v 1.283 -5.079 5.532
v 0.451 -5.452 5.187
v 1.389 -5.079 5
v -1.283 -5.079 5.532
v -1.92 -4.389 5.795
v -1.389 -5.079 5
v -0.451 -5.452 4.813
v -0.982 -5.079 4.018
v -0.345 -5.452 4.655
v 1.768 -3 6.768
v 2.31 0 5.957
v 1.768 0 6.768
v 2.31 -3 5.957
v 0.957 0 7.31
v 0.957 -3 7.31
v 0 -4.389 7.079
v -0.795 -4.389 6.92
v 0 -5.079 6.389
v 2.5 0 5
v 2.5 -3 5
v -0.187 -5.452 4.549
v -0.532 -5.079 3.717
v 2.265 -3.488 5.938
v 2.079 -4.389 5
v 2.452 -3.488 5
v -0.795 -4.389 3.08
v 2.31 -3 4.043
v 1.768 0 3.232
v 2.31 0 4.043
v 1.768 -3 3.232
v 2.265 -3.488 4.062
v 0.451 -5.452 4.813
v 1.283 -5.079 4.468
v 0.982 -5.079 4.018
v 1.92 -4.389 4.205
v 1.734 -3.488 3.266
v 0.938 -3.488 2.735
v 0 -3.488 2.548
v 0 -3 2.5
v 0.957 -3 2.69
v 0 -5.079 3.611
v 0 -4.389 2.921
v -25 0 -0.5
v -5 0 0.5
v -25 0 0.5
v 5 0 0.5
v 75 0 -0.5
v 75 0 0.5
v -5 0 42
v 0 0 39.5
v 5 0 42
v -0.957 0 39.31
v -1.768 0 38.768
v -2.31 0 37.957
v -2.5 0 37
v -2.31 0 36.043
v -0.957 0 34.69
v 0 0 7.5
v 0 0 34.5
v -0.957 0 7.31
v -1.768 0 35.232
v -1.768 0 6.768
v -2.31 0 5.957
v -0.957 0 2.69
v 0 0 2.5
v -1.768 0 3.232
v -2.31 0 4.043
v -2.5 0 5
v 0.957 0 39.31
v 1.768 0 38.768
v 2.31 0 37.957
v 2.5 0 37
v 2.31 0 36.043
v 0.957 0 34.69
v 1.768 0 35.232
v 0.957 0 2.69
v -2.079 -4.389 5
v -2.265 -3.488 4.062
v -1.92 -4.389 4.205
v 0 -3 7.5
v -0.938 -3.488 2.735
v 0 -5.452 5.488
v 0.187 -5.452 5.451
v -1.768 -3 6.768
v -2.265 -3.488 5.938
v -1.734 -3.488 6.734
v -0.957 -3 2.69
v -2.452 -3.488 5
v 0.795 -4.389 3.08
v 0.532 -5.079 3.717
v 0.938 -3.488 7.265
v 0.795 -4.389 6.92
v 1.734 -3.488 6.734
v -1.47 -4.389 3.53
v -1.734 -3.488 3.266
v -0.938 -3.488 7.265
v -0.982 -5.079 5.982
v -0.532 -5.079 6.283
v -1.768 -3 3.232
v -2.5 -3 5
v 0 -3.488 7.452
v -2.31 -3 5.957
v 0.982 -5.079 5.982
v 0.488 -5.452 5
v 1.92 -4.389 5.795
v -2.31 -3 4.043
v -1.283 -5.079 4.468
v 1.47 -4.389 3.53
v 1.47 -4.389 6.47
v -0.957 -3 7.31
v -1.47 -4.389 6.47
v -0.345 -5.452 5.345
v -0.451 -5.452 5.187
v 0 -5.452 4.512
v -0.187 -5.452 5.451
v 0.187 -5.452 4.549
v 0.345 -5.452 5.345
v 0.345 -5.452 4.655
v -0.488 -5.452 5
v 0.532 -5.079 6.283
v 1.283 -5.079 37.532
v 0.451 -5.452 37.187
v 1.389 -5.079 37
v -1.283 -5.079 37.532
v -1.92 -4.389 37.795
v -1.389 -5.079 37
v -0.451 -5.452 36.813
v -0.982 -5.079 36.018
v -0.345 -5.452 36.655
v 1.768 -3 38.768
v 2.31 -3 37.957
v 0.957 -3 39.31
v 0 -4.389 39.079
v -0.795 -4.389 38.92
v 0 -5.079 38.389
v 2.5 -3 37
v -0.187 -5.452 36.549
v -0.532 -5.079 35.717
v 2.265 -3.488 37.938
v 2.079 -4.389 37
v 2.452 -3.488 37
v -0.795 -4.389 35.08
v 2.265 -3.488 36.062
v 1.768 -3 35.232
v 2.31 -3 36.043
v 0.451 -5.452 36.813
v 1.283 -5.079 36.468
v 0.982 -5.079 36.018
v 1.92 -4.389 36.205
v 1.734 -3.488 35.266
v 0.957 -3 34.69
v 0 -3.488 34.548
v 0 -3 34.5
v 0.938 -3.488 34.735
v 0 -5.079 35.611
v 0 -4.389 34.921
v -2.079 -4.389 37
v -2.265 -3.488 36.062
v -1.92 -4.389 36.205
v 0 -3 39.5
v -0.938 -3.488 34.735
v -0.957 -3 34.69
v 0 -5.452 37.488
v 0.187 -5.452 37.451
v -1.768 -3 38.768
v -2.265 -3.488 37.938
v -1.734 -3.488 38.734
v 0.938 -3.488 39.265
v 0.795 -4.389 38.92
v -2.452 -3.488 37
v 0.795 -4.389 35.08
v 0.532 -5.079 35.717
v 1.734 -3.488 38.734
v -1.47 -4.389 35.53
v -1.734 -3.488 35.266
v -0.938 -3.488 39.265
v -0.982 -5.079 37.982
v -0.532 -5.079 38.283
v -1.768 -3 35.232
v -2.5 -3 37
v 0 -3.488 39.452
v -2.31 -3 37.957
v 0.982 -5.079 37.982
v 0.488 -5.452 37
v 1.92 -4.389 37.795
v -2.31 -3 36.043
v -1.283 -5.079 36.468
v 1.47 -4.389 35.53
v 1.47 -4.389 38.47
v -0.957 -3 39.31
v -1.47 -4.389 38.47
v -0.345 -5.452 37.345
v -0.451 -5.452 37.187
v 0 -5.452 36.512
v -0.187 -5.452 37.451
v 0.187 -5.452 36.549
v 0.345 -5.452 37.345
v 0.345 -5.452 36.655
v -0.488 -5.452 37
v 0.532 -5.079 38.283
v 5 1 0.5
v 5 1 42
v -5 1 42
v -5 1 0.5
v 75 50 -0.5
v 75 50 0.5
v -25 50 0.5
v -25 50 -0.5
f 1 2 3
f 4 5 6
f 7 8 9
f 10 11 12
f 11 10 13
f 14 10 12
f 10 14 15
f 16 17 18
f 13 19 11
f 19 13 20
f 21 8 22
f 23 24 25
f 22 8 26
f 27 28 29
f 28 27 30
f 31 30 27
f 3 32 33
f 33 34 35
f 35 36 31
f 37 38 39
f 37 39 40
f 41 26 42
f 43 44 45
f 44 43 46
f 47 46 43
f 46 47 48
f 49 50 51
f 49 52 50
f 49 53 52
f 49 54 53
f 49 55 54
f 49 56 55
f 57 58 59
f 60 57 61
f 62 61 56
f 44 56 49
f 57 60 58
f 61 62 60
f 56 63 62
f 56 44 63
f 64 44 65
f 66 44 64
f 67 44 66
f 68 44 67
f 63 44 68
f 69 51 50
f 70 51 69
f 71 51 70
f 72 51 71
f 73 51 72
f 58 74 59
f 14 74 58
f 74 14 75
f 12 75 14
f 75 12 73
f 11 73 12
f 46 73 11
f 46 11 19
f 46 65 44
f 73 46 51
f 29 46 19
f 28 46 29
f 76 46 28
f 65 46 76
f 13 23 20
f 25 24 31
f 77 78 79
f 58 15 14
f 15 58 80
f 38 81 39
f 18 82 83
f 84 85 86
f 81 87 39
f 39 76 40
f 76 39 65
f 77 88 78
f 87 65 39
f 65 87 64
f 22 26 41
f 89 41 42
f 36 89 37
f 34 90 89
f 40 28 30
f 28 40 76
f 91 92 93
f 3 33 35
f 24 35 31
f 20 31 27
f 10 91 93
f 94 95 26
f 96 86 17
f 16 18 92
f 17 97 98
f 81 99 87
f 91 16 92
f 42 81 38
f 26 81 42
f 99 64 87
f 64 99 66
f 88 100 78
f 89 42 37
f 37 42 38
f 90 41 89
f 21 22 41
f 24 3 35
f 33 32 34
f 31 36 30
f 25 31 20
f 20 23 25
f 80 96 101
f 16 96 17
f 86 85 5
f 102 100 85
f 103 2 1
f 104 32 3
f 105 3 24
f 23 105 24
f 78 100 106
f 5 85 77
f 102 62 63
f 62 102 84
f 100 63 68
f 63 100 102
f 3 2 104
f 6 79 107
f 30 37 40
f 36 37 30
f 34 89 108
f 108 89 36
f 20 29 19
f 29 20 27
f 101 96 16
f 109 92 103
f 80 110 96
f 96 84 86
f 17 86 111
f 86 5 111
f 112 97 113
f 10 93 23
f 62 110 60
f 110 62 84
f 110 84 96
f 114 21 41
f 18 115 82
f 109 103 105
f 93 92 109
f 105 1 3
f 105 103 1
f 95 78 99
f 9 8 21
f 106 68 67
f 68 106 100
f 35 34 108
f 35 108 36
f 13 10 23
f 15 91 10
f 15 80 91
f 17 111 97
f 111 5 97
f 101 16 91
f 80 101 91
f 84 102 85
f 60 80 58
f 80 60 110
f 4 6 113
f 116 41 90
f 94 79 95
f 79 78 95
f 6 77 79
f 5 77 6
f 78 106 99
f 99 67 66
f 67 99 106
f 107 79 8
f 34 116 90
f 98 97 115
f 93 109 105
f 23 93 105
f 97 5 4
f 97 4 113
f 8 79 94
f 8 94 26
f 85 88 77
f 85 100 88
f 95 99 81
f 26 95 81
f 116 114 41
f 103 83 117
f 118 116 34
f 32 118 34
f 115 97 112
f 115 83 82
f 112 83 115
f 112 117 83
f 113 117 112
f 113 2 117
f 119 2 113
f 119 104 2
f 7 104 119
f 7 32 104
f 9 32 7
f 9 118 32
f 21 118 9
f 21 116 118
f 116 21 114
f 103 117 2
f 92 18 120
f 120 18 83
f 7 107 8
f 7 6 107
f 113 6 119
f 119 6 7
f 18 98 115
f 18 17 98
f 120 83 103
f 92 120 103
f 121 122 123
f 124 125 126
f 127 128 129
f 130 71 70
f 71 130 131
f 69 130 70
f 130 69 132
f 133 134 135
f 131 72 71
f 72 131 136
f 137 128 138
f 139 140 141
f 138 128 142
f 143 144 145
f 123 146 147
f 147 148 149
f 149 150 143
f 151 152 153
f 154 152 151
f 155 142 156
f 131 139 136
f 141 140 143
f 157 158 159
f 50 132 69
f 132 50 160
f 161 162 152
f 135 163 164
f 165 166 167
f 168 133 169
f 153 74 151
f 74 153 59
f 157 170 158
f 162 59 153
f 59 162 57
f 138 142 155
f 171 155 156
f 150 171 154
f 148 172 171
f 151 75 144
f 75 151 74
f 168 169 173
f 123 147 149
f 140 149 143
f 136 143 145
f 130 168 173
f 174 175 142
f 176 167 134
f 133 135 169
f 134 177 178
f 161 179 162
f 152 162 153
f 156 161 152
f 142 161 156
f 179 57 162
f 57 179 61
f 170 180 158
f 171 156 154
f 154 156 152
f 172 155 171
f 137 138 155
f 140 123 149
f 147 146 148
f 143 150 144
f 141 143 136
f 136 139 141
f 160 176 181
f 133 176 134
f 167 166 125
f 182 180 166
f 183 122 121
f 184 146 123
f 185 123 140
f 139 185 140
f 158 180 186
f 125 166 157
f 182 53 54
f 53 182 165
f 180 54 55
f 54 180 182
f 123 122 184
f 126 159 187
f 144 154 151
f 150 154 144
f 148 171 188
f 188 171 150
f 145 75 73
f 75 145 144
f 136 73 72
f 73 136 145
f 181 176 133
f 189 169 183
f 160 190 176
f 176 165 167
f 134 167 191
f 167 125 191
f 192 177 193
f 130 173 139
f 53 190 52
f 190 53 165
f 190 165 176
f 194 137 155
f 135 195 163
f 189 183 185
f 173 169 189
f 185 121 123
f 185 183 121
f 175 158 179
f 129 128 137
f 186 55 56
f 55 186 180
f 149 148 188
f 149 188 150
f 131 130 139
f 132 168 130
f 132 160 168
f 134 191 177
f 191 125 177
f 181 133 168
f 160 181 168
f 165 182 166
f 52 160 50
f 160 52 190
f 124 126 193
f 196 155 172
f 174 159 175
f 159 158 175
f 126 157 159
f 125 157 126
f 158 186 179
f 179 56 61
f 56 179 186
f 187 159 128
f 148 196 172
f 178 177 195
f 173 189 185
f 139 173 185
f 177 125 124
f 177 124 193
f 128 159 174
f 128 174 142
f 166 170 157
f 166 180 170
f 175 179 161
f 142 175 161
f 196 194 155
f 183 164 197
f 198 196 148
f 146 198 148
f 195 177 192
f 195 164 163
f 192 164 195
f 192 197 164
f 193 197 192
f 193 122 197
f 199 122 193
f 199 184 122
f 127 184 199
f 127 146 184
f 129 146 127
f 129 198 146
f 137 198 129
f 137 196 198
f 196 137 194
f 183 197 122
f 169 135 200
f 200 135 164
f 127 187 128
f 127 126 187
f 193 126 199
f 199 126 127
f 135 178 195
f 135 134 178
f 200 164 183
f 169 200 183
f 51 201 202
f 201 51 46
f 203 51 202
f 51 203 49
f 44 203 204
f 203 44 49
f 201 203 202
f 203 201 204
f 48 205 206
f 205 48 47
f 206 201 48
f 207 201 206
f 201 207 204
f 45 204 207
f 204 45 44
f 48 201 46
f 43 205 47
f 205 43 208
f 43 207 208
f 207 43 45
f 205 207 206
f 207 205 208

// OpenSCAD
d_hole = 5;
hole_sep = 32;
hole_depth = 3;
wall_width = 1;

shelf_depth = 100;
fastener_loc = 25;

$fs = 1;
$fa = 5;

union() {
    translate([fastener_loc, 0, 0]) shelf();
    translate([0, 0, 5]) fastener();
}

module shelf() {
    length = 50;
    translate([0, length/2, 0]) cube([shelf_depth, length, wall_width], center=true);
}

module peg() {
    hull() {
        cylinder(hole_depth, d_hole/2, d_hole/2);
        translate([0, 0, hole_depth]) sphere(d_hole/2);
    }
}

module fastener() {
    translate([0, wall_width/2, hole_sep/2]) cube([10, wall_width, hole_sep+10], center=true);
    rotate([90, 0, 0]) union() {
        peg();
        translate([0, hole_sep, 0]) peg();
    }
}
